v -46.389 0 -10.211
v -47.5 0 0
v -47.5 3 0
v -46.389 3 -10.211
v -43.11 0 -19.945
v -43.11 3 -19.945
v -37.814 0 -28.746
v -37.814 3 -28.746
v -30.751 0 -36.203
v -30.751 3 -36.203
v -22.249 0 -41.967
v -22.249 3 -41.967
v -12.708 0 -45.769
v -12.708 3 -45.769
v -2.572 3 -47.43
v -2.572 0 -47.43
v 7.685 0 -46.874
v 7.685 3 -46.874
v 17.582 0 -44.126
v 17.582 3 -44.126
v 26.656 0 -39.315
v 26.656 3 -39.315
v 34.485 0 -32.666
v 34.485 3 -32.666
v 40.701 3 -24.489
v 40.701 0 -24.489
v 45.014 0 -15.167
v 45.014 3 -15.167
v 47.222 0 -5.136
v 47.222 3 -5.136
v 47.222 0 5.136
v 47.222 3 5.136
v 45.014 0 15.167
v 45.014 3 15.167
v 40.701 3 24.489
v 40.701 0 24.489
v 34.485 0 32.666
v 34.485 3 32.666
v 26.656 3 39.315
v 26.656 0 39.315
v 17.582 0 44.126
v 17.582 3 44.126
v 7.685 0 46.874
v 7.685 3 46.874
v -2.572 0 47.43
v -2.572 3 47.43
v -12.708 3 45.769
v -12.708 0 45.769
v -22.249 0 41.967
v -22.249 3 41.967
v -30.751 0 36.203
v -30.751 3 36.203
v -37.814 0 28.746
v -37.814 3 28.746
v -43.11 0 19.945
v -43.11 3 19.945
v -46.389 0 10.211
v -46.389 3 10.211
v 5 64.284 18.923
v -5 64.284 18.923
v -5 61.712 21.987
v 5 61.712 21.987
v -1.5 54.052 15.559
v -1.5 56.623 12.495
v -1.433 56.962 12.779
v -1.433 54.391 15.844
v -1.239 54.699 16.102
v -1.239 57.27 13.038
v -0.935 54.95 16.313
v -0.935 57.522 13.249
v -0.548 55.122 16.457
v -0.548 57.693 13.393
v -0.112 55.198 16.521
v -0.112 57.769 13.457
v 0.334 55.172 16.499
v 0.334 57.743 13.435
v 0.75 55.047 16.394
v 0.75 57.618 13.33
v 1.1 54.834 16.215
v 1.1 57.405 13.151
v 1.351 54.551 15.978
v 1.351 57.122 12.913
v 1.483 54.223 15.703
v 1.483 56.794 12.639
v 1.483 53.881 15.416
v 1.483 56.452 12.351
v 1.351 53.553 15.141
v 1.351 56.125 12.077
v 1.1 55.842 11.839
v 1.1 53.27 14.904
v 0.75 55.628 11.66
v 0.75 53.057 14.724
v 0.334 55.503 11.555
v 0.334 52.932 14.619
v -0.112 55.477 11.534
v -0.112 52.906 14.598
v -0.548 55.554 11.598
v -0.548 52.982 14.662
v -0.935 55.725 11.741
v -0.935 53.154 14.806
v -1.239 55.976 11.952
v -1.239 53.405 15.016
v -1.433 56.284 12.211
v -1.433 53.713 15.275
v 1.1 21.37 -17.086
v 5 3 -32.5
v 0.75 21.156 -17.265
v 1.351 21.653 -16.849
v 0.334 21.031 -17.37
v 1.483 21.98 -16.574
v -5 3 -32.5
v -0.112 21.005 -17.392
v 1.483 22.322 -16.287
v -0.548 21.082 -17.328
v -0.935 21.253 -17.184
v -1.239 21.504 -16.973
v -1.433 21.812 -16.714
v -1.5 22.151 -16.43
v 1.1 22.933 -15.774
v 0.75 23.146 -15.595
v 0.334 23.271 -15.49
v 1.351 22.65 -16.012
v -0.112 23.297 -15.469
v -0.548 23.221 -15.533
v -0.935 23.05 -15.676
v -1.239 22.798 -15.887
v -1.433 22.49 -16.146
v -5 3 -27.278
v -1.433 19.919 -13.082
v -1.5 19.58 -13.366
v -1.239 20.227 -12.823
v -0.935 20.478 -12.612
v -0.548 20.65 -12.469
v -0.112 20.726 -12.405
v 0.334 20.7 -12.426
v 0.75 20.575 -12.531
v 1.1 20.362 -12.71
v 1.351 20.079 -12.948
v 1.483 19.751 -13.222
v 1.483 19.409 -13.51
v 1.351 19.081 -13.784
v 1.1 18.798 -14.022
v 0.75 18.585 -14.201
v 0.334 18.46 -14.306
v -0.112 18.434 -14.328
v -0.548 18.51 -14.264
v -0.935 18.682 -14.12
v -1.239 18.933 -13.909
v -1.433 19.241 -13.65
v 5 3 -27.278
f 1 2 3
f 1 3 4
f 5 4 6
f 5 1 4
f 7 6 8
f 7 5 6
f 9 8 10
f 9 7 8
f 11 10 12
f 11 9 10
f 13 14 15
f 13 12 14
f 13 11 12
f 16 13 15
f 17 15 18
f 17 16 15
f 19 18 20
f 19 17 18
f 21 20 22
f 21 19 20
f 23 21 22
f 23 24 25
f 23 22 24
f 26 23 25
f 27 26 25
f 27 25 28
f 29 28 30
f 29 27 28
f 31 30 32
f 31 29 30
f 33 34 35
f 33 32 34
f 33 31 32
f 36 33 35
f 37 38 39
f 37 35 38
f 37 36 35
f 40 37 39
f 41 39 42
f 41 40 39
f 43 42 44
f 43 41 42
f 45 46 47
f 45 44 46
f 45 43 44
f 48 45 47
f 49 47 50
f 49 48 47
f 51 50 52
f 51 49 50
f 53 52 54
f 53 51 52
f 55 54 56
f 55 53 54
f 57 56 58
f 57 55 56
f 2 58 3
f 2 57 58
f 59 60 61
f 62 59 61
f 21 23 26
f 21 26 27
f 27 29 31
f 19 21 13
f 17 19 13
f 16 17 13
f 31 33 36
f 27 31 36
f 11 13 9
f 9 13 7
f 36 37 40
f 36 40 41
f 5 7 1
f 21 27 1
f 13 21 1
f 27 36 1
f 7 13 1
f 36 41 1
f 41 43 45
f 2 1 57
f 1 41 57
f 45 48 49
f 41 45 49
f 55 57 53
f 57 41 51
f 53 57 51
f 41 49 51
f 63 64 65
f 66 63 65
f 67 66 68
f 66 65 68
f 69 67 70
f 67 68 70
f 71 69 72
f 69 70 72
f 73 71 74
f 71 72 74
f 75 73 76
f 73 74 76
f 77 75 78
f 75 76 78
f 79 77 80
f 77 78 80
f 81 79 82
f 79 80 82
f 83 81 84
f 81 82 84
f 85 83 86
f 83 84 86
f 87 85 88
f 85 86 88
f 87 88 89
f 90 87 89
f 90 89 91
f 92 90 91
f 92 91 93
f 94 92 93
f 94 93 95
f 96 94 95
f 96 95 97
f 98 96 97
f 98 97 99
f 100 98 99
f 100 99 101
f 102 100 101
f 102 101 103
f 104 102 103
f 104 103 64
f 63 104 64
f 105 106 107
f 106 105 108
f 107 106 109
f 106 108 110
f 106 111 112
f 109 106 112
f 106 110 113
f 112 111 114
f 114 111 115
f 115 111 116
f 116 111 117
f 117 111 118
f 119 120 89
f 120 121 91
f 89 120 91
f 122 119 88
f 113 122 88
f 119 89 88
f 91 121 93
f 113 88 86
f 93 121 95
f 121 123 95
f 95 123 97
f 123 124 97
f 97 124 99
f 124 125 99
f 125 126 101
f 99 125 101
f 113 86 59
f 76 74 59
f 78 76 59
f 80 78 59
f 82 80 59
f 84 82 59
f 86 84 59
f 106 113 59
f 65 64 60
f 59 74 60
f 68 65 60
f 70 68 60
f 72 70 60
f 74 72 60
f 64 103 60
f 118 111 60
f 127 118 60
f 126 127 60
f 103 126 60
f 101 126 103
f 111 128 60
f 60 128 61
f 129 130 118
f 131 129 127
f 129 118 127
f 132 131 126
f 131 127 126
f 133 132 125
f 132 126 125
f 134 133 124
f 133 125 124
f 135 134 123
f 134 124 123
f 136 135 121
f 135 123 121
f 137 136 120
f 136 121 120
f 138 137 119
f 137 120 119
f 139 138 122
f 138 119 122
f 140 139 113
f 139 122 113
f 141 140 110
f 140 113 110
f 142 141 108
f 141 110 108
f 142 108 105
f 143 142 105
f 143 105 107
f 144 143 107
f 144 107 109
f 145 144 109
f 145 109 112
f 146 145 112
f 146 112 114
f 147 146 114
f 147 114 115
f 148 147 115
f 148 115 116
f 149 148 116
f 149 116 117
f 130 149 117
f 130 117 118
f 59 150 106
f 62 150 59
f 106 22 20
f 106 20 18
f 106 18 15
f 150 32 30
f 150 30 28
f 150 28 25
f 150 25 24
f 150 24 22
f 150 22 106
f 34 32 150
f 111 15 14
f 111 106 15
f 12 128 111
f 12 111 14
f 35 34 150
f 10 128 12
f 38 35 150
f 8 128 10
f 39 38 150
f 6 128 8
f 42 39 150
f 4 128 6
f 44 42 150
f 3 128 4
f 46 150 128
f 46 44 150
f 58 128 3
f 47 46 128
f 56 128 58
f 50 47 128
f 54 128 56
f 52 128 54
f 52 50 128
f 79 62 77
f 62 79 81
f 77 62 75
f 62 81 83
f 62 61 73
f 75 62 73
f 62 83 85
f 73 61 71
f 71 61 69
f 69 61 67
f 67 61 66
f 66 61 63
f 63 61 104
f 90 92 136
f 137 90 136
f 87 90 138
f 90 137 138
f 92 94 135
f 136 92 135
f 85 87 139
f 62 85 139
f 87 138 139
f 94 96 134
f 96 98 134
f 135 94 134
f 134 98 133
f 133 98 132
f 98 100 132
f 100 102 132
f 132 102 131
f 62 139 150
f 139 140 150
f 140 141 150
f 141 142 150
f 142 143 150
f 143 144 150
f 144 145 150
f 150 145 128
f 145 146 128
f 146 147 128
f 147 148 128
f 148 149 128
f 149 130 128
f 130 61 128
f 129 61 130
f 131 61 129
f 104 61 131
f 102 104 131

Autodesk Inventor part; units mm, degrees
ref_plane "YZ Plane" through (0, 0, 0) normal (1, 0, 0) x (0, 1, 0)
ref_plane "XZ Plane" through (0, 0, 0) normal (0, 1, 0) x (-1, 0, 0)
ref_plane "XY Plane" through (0, 0, 0) normal (0, 0, 1) x (1, 0, 0)
sketch "草圖1" plane through (0, 0, 0) normal (0, 1, 0) x (-1, 0, 0)
  circle A0 centre (0, 0) radius 47.5
  dimension "d0" = 95
extrude "擠出1" add sketch "草圖1" along normal blind 3
sketch "草圖2" plane through (0, 0, 0) normal (1, 0, 0) x (0, 1, 0)
  line L0 (3, -47.5) -> (3, 47.5) projected
  line L1 (0, -47.5) -> (0, 47.5) projected
  line L2 (64.2836, 18.923) -> (61.7124, 21.9872)
  line L3 (61.7124, 21.9872) -> (0.4288, -29.4358)
  line L4 (0.4288, -29.4358) -> (3, -32.5)
  line L5 (3, -32.5) -> (64.2836, 18.923)
  point P0 (0, 0)
  dimension "d3" = 4
  dimension "d4" = 80
  dimension "d5" = 50
  dimension "d6" = 15
extrude "擠出2" add sketch "草圖2" along normal mid plane 10
sketch "草圖3" plane through (5, 64.2836, 18.923) normal (0, 0.6428, -0.766) x (-1, 0, 0)
  line L0 (10, 0) -> (0, 0) projected
  line L1 (0, -80) -> (0, 0) projected
  line L2 (10, -80) -> (0, -80) projected
  line L3 (10, 0) -> (10, -80) projected
  circle A0 centre (5, -10) radius 1.5
  circle A1 centre (5, -55) radius 1.5
  point P0 (5, -61.4075)
  dimension "d9" = 3
  dimension "d10" = 3
  dimension "d11" = 45
  dimension "d15" = 10
extrude "擠出3" cut sketch "草圖3" against normal blind 10 contours A0 | A1
properties part number "CB_middle_v1"
